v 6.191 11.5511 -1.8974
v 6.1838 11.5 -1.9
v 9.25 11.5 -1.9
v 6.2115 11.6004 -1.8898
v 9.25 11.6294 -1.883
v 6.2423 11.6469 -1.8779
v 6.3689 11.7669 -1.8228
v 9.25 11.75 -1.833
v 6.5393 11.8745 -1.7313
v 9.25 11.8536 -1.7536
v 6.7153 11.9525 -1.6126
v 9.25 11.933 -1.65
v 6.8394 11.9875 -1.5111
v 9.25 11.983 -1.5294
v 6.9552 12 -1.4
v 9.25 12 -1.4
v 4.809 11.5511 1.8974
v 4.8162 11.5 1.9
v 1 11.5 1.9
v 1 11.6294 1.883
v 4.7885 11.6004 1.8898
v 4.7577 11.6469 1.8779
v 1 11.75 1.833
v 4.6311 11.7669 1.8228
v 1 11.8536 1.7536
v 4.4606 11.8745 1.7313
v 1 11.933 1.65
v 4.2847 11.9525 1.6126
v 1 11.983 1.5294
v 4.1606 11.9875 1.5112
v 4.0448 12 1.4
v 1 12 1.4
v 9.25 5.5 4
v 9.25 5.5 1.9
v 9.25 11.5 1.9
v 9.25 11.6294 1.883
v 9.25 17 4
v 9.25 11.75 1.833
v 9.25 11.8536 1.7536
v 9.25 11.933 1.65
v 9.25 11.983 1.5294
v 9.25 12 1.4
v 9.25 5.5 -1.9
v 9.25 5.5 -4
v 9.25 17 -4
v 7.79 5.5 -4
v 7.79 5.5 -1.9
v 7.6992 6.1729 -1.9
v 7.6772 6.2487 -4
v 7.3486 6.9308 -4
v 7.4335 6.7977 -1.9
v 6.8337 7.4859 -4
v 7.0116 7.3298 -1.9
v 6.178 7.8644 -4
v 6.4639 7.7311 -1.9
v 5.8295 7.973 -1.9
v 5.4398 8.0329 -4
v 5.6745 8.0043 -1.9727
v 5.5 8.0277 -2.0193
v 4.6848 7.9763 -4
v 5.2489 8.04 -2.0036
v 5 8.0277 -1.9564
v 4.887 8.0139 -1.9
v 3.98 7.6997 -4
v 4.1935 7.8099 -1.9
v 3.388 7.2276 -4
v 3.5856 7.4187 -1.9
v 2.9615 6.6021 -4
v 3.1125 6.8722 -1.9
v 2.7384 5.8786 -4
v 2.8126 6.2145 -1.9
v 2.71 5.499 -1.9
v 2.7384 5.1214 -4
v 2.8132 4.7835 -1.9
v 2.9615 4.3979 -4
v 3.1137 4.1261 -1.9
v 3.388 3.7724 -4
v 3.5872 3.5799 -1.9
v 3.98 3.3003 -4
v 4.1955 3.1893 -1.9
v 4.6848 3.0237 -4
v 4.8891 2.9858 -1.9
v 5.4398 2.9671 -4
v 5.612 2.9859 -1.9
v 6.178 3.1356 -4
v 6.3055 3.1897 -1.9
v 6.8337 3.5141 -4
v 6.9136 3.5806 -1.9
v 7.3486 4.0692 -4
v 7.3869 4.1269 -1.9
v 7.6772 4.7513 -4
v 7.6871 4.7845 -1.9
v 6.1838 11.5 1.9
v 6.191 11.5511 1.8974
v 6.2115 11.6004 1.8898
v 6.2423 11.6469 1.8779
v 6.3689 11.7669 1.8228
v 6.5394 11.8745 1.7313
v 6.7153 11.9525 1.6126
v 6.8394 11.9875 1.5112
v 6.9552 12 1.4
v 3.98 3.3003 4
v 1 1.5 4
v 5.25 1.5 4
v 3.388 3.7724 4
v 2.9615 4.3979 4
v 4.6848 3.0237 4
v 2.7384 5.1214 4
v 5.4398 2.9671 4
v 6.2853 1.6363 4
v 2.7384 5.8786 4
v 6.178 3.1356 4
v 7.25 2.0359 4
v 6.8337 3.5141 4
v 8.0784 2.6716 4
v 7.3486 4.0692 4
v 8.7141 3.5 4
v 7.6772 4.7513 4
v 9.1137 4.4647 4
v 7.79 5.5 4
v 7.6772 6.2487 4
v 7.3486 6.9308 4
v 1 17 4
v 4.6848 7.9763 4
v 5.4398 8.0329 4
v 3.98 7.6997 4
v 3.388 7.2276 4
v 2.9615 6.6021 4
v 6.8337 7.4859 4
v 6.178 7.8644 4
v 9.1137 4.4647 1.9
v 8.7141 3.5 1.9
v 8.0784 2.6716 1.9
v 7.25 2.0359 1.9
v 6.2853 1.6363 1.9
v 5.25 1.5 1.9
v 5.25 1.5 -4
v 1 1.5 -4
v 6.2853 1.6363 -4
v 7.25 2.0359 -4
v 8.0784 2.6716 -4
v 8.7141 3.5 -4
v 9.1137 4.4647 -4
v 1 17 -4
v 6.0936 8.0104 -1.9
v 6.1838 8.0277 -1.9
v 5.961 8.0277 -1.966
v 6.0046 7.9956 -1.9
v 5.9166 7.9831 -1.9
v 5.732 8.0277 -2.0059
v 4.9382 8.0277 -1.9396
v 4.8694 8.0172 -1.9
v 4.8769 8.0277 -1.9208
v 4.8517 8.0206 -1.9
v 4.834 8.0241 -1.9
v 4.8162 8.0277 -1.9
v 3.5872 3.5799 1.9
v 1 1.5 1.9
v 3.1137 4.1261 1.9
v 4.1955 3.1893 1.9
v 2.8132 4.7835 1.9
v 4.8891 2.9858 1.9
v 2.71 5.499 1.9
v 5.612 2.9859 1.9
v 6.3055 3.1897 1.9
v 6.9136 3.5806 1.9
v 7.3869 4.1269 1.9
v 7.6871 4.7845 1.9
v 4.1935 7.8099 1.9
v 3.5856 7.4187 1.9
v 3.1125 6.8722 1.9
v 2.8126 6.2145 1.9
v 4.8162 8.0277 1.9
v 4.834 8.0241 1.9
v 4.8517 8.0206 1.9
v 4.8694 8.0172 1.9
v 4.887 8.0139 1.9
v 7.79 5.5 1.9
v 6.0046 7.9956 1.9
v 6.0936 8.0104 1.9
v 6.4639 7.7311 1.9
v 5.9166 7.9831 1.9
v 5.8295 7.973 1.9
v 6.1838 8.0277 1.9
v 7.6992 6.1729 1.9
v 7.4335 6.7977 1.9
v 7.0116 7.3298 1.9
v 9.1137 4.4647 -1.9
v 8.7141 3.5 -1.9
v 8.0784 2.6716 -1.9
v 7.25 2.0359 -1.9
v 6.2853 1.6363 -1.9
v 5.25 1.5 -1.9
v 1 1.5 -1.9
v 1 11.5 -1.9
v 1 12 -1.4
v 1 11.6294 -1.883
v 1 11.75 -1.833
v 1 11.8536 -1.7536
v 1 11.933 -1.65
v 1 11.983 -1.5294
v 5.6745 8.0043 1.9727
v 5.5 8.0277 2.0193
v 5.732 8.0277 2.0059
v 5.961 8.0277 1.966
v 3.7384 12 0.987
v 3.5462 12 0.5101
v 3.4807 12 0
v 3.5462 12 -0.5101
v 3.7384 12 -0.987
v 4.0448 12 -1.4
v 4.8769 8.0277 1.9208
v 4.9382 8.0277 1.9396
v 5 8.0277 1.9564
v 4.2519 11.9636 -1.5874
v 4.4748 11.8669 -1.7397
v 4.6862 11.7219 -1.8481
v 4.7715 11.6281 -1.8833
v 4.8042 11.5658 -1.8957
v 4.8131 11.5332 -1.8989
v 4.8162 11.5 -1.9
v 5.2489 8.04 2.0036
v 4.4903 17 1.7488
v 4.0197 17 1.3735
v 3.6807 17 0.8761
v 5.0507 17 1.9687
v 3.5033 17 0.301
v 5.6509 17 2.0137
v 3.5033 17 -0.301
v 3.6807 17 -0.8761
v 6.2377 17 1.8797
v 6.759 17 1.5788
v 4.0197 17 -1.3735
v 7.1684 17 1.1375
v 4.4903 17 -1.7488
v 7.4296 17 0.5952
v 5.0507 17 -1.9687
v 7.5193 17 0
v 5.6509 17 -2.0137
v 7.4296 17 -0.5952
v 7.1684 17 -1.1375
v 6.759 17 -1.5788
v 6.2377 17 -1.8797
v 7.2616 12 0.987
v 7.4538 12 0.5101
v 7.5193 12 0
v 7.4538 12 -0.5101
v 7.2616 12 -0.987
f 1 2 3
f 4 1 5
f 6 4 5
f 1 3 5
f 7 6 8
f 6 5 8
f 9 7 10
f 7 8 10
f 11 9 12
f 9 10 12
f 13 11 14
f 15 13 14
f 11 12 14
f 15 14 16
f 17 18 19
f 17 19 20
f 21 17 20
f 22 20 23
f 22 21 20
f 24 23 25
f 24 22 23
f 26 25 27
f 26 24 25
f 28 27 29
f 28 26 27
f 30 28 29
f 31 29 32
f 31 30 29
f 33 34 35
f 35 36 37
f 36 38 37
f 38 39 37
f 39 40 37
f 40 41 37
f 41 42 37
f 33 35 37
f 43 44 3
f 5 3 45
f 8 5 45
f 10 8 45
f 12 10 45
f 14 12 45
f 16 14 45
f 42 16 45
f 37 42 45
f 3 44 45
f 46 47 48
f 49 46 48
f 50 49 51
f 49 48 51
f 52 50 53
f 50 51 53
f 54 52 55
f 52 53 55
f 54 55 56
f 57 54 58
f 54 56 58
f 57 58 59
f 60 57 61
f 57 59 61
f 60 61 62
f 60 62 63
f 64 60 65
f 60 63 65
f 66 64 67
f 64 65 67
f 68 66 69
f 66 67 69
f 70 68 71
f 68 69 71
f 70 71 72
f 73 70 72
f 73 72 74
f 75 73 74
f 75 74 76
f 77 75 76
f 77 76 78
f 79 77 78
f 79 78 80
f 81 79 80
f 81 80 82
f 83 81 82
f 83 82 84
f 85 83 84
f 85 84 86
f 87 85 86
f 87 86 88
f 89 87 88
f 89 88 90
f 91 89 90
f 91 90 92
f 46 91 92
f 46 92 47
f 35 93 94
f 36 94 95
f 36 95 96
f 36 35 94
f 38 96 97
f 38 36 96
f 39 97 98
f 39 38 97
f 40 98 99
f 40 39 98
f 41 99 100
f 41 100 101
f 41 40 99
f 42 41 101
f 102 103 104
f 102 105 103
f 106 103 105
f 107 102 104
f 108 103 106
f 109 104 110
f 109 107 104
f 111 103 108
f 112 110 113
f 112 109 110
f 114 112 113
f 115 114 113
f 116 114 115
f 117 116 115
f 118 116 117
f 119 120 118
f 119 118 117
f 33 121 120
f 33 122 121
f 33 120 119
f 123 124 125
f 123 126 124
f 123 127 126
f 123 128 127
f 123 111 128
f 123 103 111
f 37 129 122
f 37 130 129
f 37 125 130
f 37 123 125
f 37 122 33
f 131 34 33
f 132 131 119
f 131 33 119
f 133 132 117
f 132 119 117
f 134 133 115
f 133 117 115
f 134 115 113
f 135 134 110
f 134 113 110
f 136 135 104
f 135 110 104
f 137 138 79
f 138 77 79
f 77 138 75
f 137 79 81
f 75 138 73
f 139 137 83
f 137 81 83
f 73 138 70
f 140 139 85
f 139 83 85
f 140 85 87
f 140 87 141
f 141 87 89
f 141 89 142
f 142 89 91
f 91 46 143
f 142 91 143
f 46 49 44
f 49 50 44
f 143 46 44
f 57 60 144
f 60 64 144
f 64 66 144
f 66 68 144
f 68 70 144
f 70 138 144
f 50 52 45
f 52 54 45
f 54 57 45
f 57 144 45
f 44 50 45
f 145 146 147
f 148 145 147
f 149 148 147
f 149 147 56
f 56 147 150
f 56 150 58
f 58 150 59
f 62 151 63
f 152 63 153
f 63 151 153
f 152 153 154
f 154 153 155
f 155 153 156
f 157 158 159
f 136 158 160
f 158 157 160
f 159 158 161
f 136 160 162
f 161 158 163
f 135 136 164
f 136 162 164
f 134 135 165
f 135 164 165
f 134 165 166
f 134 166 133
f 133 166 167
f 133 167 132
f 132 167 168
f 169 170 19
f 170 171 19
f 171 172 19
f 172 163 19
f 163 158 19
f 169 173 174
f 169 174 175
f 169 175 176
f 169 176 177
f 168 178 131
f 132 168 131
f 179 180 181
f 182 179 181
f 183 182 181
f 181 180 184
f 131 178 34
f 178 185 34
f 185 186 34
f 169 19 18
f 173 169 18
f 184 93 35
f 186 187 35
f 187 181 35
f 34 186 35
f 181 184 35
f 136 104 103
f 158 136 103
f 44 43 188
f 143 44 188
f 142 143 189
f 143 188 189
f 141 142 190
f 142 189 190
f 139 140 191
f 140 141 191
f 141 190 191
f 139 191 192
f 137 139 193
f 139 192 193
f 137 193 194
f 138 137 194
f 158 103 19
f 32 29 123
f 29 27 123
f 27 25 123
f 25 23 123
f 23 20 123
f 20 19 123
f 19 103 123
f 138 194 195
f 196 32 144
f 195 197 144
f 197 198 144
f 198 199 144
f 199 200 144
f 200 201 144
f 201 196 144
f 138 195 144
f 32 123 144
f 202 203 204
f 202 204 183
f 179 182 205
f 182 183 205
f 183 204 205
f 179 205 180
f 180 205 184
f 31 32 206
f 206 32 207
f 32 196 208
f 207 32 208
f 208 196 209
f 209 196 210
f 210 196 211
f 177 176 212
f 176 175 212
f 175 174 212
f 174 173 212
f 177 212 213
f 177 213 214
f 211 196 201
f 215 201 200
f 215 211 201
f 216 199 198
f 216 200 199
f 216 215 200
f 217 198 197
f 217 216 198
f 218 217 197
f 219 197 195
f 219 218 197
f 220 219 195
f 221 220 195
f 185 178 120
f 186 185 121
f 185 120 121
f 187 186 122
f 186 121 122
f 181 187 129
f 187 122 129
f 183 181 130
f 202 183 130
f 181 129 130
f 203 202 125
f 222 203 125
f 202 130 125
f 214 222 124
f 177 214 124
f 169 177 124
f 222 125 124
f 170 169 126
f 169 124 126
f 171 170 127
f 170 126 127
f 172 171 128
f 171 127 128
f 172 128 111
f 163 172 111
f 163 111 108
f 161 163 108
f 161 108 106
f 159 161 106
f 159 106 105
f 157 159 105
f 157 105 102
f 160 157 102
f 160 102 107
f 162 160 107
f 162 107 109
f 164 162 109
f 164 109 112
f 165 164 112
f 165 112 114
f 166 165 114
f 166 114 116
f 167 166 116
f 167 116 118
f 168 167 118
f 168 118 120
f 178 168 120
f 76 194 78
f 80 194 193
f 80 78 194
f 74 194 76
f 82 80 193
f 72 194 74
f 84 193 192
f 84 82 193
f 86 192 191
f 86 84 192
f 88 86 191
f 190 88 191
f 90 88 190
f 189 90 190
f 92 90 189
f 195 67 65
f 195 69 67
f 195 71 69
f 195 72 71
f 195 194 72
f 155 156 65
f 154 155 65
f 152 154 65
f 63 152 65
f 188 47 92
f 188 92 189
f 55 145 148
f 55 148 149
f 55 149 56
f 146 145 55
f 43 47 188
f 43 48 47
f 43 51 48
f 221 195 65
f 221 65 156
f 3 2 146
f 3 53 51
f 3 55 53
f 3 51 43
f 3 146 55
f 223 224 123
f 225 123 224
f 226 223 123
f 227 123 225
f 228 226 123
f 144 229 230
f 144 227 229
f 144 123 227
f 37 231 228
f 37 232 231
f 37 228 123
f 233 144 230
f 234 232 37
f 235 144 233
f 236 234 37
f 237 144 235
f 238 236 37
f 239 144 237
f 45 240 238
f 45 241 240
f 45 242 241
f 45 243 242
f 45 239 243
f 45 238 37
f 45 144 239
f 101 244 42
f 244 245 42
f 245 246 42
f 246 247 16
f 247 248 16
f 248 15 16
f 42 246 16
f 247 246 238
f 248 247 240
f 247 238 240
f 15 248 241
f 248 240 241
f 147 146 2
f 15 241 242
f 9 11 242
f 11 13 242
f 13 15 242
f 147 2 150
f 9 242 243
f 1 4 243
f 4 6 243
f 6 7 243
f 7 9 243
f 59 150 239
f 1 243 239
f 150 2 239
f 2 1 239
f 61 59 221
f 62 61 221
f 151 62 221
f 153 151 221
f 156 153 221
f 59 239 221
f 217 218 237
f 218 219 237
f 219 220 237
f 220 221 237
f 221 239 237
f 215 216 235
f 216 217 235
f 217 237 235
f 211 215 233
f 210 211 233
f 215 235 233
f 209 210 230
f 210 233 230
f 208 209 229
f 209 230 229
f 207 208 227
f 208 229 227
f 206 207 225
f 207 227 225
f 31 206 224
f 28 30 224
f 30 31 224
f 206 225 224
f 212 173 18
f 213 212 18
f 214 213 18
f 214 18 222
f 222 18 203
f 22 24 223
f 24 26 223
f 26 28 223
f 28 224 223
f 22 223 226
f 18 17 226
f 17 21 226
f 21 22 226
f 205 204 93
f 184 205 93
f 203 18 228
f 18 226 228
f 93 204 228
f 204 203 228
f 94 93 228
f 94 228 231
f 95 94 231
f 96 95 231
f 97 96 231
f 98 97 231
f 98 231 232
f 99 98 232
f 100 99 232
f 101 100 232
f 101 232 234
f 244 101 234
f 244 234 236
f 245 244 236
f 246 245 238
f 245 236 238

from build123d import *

# Parameters (mm, degrees)
BOSS_EXTRUDE1_DEPTH      = 4
BOSS_EXTRUDE1_DEPTH_BACK = 4
SKETCH1_W                = 9.25
SKETCH1_H                = 17
CUT_EXTRUDE1_DEPTH       = 1.9
CUT_EXTRUDE1_DEPTH_BACK  = 1.9
SKETCH2_W                = 9.25
SKETCH2_H                = 12
SKETCH3_R                = 2.54
CUT_EXTRUDE2_DEPTH       = 21.941883869
FILLET1_R                = 0.5
CUT_EXTRUDE5_DEPTH       = 21.941884033
CUT_EXTRUDE6_REACH       = 20.488
SKETCH9_W                = 1.000000032
SKETCH9_H                = 8


# Read off the part's stored shape, not the designer's step: #10-32 Tapped Hole1
with BuildPart() as part:
    # Sketch1 → Boss-Extrude1 (new, two sides: drawn at the far end of the back side and taken through both)
    with BuildSketch(Plane.XY.offset(-BOSS_EXTRUDE1_DEPTH_BACK)):
        with Locations((4.625, 8.5)):
            Rectangle(SKETCH1_W, SKETCH1_H)
    extrude(amount=BOSS_EXTRUDE1_DEPTH + BOSS_EXTRUDE1_DEPTH_BACK)

    # Sketch2 → Cut-Extrude1 (cut, two sides: drawn at the far end of the back side and taken through both)
    with BuildSketch(Plane.XY.offset(-CUT_EXTRUDE1_DEPTH_BACK)):
        with Locations((4.625, 6)):
            Rectangle(SKETCH2_W, SKETCH2_H)
    extrude(amount=CUT_EXTRUDE1_DEPTH + CUT_EXTRUDE1_DEPTH_BACK, mode=Mode.SUBTRACT)

    # Sketch3 → Cut-Extrude2 (cut, through all)
    with BuildSketch(Plane.XY.offset(4)):
        with Locations((5.25, 5.5)):
            Circle(SKETCH3_R)
    extrude(amount=-CUT_EXTRUDE2_DEPTH, mode=Mode.SUBTRACT)

    # #10-32 Tapped Hole1 outline → #10-32 Tapped Hole1 (revolve, cut)
    with BuildSketch(Plane(origin=(5.5, 0, 0), x_dir=(1, 0, 0), z_dir=(0, 0, 1))):
        Polygon((0, 7.973018958), (1.928351252, 7.973018958), (2.019302964, 8.027668689), (2.0193, 17), (0, 17), align=None)
    revolve(axis=Axis((5.5, 0, 0), (0, 1, 0)), mode=Mode.SUBTRACT)

    # Fillet1
    fillet1_edges = [part.edges().sort_by_distance(p)[0] for p in [
        (7.716900739, 12, -1.9),
        (7.716900739, 12, 1.9),
        (2.408099261, 12, -1.9),
        (2.408099261, 12, 1.9),
    ]]
    fillet(fillet1_edges, radius=FILLET1_R)

    # Sketch7 → Cut-Extrude5 (cut, through all)
    with BuildSketch(Plane.XY.offset(4)):
        with BuildLine():
            Line((5.25, 1.5), (0, 1.5))
            Line((0, 1.5), (0, 0))
            Line((0, 0), (9.25, 0))
            Line((9.25, 0), (9.25, 5.5))
            ThreePointArc((9.25, 5.5), (8.078427125, 2.671572875), (5.25, 1.5))
        make_face()
    extrude(amount=-CUT_EXTRUDE5_DEPTH, mode=Mode.SUBTRACT)

    # Sketch9 → Cut-Extrude6 (cut, up to next)
    with BuildSketch(Plane(origin=(0, 17, 0), x_dir=(1, 0, 0), z_dir=(0, 1, 0)), mode=Mode.PRIVATE) as cut_extrude6_sk1:
        with Locations((0.500000016, 0)):
            Rectangle(SKETCH9_W, SKETCH9_H)
    cut_extrude6_tool1 = extrude(cut_extrude6_sk1.sketch, amount=-CUT_EXTRUDE6_REACH, mode=Mode.PRIVATE) & part.part
    add(cut_extrude6_tool1.solids().sort_by_distance((0.5, 17, 0))[0], mode=Mode.SUBTRACT)


solid = part.part
